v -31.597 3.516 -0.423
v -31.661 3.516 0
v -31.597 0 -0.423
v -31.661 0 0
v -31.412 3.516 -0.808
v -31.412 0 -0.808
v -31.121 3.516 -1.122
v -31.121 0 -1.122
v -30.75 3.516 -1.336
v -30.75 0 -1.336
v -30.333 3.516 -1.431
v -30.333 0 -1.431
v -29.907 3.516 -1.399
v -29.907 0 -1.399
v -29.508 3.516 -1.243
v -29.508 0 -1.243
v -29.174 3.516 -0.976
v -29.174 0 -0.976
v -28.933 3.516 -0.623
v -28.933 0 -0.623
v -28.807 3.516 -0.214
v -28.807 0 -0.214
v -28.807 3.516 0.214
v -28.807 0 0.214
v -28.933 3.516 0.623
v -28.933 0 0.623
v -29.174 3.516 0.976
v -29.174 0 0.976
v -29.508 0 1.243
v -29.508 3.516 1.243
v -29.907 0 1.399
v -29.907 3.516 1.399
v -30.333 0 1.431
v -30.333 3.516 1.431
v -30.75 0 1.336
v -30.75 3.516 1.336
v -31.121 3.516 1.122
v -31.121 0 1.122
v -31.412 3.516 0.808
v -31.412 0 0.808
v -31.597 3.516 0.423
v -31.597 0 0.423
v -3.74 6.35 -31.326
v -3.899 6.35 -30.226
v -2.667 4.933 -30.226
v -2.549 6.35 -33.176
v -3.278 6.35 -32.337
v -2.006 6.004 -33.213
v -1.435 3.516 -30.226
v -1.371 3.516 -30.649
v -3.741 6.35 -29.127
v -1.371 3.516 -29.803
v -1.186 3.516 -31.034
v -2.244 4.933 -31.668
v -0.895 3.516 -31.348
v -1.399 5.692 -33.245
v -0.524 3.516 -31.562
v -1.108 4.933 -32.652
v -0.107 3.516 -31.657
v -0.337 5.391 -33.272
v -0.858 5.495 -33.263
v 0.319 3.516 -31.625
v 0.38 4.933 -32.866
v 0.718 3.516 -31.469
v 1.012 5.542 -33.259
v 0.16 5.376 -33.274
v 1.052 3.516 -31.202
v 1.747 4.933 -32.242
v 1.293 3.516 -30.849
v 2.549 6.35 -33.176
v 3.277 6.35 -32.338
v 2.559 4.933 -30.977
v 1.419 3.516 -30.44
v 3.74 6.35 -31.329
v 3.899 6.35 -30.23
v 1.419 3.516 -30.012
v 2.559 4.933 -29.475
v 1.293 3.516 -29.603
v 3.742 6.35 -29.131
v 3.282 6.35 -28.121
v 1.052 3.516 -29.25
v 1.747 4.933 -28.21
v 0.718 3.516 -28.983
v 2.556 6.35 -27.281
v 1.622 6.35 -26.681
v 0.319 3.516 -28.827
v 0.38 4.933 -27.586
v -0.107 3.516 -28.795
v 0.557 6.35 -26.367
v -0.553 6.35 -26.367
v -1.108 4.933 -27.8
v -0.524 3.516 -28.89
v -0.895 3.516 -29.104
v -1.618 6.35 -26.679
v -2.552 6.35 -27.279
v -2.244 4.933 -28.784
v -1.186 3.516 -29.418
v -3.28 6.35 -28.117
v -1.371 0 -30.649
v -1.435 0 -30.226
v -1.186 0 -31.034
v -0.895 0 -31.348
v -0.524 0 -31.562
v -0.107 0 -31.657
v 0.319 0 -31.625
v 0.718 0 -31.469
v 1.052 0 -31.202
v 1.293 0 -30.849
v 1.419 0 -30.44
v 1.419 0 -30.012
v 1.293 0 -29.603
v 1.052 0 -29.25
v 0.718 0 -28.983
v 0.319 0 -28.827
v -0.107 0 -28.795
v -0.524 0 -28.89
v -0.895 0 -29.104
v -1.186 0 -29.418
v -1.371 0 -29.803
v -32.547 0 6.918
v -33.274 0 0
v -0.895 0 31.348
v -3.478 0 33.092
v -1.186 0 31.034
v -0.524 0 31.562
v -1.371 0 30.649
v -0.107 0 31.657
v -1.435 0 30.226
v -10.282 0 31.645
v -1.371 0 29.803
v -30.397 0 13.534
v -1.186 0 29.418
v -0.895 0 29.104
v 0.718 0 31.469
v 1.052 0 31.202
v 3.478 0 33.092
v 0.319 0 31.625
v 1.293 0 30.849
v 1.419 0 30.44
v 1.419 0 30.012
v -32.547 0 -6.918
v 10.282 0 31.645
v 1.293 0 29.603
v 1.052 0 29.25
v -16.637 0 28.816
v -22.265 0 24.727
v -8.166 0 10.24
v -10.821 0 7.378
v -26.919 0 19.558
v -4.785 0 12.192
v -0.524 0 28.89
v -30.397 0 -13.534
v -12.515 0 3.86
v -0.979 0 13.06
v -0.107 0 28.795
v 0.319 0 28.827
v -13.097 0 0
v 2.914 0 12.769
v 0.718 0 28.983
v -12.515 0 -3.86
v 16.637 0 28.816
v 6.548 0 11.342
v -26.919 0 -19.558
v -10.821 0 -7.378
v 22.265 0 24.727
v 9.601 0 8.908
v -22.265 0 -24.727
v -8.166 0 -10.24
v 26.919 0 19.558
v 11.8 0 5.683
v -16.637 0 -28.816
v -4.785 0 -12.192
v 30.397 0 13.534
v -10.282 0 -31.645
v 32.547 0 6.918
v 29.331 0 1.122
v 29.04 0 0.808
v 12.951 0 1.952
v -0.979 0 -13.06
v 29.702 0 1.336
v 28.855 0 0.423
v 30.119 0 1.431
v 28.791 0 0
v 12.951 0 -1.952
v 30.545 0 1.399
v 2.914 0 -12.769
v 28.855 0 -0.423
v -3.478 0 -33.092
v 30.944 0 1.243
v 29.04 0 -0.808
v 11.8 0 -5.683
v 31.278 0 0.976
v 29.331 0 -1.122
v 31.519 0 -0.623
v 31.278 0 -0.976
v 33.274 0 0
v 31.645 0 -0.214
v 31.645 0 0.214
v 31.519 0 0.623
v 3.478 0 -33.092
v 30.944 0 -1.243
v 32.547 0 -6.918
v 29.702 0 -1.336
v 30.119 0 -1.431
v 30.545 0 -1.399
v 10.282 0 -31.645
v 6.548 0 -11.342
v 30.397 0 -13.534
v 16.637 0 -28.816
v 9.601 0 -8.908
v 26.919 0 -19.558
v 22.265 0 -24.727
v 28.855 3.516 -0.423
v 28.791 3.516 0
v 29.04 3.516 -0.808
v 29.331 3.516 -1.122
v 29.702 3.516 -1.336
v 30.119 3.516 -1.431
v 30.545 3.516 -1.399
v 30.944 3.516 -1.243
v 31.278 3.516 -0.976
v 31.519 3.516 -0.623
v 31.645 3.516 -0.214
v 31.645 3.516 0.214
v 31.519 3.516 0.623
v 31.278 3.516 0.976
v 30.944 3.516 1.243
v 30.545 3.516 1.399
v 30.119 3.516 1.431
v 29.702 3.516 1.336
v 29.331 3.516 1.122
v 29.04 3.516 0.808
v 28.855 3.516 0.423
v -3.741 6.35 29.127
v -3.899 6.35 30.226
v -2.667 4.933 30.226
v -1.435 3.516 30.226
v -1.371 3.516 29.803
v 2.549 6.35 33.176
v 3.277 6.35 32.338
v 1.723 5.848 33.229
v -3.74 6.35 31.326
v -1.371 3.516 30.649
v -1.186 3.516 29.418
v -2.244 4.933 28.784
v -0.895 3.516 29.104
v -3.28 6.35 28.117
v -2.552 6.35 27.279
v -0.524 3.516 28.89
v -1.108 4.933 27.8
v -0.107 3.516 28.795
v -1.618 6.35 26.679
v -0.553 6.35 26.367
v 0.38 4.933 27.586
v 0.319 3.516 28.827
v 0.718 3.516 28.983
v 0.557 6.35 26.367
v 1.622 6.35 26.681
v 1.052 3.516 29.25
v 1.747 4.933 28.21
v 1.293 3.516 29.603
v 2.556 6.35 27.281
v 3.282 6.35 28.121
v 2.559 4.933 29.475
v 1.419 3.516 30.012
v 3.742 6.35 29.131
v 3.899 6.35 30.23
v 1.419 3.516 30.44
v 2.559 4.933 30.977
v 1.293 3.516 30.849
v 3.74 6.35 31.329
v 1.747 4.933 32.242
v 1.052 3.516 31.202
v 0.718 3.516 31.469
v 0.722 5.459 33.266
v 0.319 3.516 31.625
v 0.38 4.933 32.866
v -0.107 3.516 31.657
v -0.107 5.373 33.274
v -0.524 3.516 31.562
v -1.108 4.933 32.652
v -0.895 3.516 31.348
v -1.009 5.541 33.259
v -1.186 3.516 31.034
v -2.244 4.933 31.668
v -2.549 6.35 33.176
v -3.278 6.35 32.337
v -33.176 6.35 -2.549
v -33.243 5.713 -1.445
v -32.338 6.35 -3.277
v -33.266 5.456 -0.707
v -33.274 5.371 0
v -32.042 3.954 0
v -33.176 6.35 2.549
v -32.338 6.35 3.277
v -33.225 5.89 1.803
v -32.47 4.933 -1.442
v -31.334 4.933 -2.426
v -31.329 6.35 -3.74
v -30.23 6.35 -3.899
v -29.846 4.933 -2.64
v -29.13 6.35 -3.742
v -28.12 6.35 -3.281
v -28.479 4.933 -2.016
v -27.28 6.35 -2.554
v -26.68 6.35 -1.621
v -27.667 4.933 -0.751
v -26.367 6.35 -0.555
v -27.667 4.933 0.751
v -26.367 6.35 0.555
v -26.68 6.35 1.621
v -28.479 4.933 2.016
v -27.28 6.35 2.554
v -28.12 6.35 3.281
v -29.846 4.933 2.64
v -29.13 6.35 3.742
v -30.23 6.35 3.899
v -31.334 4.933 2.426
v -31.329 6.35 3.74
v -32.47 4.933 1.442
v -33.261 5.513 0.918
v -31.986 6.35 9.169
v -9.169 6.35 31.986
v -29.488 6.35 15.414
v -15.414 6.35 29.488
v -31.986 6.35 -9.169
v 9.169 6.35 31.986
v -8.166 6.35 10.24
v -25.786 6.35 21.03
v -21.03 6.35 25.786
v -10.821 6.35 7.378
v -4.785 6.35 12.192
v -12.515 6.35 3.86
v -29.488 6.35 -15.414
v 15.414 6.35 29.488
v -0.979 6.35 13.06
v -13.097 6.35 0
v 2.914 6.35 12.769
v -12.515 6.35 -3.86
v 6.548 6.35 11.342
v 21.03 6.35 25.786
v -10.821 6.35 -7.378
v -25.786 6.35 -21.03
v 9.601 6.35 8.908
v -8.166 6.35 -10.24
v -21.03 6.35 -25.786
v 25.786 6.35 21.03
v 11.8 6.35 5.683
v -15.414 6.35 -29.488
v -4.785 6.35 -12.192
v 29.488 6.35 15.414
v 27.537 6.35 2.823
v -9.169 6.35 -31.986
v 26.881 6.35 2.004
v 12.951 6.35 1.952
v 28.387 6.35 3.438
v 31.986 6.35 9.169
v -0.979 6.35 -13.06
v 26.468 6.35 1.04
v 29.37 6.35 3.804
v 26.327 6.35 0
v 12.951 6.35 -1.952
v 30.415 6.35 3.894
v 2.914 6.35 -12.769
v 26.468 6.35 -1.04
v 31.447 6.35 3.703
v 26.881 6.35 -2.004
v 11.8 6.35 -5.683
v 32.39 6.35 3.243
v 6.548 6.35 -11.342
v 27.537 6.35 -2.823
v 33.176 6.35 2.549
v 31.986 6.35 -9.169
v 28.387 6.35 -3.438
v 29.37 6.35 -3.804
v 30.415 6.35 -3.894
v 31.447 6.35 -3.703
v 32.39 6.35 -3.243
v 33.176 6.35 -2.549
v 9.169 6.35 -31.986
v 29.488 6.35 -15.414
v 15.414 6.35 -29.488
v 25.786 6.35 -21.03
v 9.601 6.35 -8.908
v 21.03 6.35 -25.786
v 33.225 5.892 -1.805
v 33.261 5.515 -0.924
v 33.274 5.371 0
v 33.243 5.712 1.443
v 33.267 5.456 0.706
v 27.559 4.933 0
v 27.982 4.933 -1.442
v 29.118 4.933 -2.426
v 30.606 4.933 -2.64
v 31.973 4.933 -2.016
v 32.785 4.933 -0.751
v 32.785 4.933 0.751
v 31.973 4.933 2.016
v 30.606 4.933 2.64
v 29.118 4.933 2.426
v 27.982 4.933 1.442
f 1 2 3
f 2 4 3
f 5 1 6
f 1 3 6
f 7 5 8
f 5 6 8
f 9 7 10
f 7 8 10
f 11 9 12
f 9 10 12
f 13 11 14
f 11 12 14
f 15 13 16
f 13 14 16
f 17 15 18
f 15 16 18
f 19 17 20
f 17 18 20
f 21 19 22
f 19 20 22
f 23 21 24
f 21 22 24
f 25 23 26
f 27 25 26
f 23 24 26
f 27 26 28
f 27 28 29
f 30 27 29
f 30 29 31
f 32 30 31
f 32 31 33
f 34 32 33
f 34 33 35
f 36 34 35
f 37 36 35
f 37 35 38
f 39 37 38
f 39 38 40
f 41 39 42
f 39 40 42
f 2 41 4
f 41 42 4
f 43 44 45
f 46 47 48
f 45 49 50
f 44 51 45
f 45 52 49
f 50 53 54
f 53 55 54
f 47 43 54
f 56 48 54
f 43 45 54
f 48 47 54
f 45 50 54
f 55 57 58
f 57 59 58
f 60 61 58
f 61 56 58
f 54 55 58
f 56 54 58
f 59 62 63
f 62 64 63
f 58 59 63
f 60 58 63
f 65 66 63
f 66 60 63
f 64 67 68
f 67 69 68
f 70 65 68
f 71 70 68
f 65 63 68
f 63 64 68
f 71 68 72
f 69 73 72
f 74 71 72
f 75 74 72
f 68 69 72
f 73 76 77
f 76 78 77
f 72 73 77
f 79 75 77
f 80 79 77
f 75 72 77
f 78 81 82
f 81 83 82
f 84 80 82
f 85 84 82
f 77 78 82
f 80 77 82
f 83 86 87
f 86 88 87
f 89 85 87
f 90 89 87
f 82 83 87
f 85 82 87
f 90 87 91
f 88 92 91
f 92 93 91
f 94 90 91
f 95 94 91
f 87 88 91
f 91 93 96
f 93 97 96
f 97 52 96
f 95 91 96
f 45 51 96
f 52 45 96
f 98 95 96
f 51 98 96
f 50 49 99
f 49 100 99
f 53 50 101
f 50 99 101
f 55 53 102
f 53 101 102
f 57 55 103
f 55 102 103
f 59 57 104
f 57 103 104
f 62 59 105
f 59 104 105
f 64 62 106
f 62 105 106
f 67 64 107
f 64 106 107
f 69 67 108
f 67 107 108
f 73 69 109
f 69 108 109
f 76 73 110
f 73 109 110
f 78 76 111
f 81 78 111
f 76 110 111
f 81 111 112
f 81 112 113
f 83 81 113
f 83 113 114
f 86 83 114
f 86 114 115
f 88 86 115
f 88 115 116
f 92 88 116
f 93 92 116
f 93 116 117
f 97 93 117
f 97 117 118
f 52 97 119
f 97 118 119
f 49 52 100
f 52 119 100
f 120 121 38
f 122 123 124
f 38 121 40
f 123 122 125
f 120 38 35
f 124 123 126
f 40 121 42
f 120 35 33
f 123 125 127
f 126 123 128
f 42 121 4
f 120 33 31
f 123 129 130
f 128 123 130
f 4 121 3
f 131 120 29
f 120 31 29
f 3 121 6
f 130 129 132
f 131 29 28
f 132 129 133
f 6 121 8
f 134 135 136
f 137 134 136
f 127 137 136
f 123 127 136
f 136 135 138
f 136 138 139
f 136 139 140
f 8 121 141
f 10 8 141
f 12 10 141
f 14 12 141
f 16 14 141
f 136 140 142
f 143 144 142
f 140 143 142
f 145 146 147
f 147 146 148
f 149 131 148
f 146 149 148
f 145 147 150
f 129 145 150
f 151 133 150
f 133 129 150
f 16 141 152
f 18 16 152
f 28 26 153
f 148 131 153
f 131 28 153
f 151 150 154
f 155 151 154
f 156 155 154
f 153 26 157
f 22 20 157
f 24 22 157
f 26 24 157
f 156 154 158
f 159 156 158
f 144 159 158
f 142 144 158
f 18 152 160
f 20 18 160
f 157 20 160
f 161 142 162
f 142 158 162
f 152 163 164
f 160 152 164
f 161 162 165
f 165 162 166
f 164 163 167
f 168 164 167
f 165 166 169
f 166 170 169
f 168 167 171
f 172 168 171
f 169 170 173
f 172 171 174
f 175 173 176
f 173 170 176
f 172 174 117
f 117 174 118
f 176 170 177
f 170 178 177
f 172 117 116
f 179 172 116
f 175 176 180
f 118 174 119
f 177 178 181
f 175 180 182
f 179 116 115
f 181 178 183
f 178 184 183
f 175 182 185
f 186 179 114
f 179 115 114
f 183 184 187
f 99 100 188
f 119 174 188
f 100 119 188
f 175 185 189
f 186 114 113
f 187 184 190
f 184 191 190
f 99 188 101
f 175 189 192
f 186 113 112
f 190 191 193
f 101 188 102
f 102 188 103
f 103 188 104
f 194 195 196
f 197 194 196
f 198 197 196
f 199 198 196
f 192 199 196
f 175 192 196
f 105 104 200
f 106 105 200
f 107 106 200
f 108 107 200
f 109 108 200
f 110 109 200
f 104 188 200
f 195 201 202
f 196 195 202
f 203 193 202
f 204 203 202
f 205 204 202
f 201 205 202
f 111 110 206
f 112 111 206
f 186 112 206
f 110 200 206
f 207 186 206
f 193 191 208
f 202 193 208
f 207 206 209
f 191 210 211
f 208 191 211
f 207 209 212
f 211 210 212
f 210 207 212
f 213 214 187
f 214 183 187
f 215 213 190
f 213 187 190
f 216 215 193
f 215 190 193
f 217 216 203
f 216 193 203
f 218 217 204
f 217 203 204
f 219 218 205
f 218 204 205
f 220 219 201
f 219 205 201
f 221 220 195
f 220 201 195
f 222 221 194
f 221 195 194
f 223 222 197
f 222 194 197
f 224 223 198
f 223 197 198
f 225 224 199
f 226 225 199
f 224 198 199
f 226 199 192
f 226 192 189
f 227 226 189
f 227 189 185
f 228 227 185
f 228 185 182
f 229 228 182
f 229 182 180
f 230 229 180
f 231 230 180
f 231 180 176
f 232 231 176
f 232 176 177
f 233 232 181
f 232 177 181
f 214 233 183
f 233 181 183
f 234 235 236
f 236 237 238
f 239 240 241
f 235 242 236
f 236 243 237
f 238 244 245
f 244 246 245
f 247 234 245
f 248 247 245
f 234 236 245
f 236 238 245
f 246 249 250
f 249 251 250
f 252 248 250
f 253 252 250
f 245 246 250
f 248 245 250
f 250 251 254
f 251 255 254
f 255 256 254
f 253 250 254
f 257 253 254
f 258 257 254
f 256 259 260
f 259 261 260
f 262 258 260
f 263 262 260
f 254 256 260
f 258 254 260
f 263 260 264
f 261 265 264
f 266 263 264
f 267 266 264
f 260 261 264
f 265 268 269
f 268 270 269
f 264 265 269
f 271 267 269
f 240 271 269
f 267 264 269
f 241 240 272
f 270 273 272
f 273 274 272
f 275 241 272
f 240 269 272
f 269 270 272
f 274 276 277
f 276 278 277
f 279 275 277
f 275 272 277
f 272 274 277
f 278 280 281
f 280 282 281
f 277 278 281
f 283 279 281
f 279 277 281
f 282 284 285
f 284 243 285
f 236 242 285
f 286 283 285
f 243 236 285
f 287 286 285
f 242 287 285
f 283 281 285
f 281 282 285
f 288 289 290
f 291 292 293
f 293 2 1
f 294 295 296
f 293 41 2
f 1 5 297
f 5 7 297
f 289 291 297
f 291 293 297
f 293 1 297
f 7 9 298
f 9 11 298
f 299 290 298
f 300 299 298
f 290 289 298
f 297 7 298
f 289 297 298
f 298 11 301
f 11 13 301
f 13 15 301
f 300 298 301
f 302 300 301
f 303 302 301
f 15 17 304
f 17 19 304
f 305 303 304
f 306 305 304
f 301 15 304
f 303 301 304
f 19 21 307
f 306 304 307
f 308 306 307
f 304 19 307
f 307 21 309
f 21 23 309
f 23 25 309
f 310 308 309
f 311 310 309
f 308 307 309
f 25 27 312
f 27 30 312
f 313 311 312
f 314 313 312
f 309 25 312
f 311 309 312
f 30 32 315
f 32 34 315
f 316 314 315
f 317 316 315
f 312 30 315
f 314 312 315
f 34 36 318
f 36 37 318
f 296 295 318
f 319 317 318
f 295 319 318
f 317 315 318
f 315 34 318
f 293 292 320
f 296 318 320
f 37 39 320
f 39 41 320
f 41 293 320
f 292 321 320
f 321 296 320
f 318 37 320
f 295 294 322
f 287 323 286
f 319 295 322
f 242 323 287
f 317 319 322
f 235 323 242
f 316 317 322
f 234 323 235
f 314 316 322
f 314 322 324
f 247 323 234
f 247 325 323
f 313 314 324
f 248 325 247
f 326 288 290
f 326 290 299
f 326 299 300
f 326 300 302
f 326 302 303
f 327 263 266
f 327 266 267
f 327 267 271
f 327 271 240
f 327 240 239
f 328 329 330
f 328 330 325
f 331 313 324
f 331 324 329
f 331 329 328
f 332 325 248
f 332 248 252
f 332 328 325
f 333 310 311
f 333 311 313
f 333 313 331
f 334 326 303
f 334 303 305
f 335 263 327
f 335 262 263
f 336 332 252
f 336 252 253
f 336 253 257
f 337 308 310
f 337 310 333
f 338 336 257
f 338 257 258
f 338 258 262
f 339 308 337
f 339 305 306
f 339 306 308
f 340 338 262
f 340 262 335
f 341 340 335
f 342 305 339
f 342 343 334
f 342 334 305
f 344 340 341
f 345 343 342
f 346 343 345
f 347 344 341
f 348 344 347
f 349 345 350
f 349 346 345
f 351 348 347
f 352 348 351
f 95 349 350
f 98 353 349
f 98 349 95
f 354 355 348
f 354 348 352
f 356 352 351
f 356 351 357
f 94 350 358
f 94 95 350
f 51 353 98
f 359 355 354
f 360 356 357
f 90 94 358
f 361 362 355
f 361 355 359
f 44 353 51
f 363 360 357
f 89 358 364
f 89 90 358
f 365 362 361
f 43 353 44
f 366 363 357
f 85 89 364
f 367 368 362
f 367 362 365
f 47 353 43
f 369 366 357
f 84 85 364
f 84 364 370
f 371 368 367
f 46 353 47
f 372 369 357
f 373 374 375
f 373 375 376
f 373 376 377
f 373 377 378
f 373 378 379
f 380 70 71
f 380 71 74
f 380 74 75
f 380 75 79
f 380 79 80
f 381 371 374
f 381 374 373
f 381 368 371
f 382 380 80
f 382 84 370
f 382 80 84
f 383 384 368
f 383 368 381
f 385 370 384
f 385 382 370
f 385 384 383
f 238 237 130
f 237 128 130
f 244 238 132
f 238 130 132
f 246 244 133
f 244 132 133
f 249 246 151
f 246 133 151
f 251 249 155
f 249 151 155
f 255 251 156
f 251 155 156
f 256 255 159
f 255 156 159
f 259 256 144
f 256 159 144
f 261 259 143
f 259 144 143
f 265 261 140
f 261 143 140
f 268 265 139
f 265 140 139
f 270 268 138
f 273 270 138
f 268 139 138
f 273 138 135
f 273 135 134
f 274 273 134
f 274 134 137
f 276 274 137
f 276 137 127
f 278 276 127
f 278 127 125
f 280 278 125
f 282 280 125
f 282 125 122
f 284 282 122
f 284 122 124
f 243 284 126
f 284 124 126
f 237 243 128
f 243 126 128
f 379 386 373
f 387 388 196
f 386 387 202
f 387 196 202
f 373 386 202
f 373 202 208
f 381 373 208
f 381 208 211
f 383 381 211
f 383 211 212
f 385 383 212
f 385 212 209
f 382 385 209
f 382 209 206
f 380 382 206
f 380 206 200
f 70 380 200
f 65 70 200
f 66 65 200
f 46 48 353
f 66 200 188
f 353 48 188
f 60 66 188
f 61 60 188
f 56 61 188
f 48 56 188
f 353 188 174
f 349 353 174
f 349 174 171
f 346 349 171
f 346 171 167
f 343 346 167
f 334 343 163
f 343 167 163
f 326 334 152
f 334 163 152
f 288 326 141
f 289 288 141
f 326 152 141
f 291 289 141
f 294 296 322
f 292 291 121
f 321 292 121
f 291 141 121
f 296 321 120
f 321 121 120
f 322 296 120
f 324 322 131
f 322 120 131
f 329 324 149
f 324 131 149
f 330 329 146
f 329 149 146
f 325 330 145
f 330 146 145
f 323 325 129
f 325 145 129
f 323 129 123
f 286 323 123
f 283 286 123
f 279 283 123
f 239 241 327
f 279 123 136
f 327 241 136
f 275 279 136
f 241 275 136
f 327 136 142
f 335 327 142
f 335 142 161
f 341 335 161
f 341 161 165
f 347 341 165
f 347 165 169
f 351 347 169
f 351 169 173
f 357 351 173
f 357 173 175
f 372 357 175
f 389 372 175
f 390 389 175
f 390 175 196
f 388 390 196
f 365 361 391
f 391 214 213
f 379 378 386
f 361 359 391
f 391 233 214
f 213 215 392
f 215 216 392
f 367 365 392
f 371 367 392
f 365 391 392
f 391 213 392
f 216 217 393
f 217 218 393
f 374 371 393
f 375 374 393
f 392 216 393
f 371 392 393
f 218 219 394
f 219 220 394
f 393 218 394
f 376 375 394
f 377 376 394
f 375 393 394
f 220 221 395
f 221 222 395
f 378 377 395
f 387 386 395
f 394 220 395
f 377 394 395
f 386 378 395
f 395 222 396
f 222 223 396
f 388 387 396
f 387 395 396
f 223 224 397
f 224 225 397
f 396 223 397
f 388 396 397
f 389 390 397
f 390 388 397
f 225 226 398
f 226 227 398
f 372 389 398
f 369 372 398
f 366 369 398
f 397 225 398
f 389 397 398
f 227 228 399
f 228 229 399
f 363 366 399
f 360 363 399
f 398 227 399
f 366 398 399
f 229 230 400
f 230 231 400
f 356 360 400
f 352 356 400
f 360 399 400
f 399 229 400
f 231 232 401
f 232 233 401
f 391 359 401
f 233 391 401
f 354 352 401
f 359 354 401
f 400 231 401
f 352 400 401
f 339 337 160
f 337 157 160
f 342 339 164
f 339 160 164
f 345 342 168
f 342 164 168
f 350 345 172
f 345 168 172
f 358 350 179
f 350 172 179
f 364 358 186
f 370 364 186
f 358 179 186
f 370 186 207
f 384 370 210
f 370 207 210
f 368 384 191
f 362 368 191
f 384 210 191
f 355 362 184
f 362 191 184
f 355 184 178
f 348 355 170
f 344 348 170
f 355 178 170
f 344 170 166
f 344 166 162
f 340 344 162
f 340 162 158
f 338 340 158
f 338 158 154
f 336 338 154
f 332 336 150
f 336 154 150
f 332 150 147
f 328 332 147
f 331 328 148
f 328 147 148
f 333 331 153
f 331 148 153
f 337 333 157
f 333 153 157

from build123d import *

# Parameters (mm, degrees)
SKETCH1_R                 = 33.274
BOSS_EXTRUDE1_DEPTH       = 6.35
PLATEMTGSCREW_D           = 2.8702
PLATEMTGSCREW_DEPTH       = 10.1854
PLATEMTGSCREW_CSINK_D     = 7.7978
PLATEMTGSCREW_CSINK_ANGLE = 82
PLATEMTGSCREW_TIP         = 0.862295074
SHAFTBORE_D               = 26.19375
SHAFTBORE_DEPTH           = 6.35
SHAFTBORE_TIP             = 7.86939642


with BuildPart() as part:
    # Sketch1 → Boss-Extrude1 (new body)
    with BuildSketch(Plane(origin=(0, 0, 0), x_dir=(1, 0, 0), z_dir=(0, 1, 0))):
        Circle(SKETCH1_R)
    extrude(amount=BOSS_EXTRUDE1_DEPTH)

    # PlateMtgScrew
    with Locations(Plane(origin=(0, 6.35, 0), x_dir=(1, 0, 0), z_dir=(0, 1, 0))):
        with Locations((0, 30.226), (-30.226, 0), (0, -30.226), (30.226, 0)):
            CounterSinkHole(PLATEMTGSCREW_D / 2, PLATEMTGSCREW_CSINK_D / 2, depth=PLATEMTGSCREW_DEPTH, counter_sink_angle=PLATEMTGSCREW_CSINK_ANGLE)
            with Locations((0, 0, -(PLATEMTGSCREW_DEPTH + PLATEMTGSCREW_TIP / 2))):  # 118° drill point
                Cone(0, PLATEMTGSCREW_D / 2, PLATEMTGSCREW_TIP, mode=Mode.SUBTRACT)

    # ShaftBore
    with Locations(Plane(origin=(0, 6.35, 0), x_dir=(1, 0, 0), z_dir=(0, 1, 0))):
        with Locations((0, 0)):
            Hole(SHAFTBORE_D / 2, depth=SHAFTBORE_DEPTH)
            with Locations((0, 0, -(SHAFTBORE_DEPTH + SHAFTBORE_TIP / 2))):  # 118° drill point
                Cone(0, SHAFTBORE_D / 2, SHAFTBORE_TIP, mode=Mode.SUBTRACT)


solid = part.part
